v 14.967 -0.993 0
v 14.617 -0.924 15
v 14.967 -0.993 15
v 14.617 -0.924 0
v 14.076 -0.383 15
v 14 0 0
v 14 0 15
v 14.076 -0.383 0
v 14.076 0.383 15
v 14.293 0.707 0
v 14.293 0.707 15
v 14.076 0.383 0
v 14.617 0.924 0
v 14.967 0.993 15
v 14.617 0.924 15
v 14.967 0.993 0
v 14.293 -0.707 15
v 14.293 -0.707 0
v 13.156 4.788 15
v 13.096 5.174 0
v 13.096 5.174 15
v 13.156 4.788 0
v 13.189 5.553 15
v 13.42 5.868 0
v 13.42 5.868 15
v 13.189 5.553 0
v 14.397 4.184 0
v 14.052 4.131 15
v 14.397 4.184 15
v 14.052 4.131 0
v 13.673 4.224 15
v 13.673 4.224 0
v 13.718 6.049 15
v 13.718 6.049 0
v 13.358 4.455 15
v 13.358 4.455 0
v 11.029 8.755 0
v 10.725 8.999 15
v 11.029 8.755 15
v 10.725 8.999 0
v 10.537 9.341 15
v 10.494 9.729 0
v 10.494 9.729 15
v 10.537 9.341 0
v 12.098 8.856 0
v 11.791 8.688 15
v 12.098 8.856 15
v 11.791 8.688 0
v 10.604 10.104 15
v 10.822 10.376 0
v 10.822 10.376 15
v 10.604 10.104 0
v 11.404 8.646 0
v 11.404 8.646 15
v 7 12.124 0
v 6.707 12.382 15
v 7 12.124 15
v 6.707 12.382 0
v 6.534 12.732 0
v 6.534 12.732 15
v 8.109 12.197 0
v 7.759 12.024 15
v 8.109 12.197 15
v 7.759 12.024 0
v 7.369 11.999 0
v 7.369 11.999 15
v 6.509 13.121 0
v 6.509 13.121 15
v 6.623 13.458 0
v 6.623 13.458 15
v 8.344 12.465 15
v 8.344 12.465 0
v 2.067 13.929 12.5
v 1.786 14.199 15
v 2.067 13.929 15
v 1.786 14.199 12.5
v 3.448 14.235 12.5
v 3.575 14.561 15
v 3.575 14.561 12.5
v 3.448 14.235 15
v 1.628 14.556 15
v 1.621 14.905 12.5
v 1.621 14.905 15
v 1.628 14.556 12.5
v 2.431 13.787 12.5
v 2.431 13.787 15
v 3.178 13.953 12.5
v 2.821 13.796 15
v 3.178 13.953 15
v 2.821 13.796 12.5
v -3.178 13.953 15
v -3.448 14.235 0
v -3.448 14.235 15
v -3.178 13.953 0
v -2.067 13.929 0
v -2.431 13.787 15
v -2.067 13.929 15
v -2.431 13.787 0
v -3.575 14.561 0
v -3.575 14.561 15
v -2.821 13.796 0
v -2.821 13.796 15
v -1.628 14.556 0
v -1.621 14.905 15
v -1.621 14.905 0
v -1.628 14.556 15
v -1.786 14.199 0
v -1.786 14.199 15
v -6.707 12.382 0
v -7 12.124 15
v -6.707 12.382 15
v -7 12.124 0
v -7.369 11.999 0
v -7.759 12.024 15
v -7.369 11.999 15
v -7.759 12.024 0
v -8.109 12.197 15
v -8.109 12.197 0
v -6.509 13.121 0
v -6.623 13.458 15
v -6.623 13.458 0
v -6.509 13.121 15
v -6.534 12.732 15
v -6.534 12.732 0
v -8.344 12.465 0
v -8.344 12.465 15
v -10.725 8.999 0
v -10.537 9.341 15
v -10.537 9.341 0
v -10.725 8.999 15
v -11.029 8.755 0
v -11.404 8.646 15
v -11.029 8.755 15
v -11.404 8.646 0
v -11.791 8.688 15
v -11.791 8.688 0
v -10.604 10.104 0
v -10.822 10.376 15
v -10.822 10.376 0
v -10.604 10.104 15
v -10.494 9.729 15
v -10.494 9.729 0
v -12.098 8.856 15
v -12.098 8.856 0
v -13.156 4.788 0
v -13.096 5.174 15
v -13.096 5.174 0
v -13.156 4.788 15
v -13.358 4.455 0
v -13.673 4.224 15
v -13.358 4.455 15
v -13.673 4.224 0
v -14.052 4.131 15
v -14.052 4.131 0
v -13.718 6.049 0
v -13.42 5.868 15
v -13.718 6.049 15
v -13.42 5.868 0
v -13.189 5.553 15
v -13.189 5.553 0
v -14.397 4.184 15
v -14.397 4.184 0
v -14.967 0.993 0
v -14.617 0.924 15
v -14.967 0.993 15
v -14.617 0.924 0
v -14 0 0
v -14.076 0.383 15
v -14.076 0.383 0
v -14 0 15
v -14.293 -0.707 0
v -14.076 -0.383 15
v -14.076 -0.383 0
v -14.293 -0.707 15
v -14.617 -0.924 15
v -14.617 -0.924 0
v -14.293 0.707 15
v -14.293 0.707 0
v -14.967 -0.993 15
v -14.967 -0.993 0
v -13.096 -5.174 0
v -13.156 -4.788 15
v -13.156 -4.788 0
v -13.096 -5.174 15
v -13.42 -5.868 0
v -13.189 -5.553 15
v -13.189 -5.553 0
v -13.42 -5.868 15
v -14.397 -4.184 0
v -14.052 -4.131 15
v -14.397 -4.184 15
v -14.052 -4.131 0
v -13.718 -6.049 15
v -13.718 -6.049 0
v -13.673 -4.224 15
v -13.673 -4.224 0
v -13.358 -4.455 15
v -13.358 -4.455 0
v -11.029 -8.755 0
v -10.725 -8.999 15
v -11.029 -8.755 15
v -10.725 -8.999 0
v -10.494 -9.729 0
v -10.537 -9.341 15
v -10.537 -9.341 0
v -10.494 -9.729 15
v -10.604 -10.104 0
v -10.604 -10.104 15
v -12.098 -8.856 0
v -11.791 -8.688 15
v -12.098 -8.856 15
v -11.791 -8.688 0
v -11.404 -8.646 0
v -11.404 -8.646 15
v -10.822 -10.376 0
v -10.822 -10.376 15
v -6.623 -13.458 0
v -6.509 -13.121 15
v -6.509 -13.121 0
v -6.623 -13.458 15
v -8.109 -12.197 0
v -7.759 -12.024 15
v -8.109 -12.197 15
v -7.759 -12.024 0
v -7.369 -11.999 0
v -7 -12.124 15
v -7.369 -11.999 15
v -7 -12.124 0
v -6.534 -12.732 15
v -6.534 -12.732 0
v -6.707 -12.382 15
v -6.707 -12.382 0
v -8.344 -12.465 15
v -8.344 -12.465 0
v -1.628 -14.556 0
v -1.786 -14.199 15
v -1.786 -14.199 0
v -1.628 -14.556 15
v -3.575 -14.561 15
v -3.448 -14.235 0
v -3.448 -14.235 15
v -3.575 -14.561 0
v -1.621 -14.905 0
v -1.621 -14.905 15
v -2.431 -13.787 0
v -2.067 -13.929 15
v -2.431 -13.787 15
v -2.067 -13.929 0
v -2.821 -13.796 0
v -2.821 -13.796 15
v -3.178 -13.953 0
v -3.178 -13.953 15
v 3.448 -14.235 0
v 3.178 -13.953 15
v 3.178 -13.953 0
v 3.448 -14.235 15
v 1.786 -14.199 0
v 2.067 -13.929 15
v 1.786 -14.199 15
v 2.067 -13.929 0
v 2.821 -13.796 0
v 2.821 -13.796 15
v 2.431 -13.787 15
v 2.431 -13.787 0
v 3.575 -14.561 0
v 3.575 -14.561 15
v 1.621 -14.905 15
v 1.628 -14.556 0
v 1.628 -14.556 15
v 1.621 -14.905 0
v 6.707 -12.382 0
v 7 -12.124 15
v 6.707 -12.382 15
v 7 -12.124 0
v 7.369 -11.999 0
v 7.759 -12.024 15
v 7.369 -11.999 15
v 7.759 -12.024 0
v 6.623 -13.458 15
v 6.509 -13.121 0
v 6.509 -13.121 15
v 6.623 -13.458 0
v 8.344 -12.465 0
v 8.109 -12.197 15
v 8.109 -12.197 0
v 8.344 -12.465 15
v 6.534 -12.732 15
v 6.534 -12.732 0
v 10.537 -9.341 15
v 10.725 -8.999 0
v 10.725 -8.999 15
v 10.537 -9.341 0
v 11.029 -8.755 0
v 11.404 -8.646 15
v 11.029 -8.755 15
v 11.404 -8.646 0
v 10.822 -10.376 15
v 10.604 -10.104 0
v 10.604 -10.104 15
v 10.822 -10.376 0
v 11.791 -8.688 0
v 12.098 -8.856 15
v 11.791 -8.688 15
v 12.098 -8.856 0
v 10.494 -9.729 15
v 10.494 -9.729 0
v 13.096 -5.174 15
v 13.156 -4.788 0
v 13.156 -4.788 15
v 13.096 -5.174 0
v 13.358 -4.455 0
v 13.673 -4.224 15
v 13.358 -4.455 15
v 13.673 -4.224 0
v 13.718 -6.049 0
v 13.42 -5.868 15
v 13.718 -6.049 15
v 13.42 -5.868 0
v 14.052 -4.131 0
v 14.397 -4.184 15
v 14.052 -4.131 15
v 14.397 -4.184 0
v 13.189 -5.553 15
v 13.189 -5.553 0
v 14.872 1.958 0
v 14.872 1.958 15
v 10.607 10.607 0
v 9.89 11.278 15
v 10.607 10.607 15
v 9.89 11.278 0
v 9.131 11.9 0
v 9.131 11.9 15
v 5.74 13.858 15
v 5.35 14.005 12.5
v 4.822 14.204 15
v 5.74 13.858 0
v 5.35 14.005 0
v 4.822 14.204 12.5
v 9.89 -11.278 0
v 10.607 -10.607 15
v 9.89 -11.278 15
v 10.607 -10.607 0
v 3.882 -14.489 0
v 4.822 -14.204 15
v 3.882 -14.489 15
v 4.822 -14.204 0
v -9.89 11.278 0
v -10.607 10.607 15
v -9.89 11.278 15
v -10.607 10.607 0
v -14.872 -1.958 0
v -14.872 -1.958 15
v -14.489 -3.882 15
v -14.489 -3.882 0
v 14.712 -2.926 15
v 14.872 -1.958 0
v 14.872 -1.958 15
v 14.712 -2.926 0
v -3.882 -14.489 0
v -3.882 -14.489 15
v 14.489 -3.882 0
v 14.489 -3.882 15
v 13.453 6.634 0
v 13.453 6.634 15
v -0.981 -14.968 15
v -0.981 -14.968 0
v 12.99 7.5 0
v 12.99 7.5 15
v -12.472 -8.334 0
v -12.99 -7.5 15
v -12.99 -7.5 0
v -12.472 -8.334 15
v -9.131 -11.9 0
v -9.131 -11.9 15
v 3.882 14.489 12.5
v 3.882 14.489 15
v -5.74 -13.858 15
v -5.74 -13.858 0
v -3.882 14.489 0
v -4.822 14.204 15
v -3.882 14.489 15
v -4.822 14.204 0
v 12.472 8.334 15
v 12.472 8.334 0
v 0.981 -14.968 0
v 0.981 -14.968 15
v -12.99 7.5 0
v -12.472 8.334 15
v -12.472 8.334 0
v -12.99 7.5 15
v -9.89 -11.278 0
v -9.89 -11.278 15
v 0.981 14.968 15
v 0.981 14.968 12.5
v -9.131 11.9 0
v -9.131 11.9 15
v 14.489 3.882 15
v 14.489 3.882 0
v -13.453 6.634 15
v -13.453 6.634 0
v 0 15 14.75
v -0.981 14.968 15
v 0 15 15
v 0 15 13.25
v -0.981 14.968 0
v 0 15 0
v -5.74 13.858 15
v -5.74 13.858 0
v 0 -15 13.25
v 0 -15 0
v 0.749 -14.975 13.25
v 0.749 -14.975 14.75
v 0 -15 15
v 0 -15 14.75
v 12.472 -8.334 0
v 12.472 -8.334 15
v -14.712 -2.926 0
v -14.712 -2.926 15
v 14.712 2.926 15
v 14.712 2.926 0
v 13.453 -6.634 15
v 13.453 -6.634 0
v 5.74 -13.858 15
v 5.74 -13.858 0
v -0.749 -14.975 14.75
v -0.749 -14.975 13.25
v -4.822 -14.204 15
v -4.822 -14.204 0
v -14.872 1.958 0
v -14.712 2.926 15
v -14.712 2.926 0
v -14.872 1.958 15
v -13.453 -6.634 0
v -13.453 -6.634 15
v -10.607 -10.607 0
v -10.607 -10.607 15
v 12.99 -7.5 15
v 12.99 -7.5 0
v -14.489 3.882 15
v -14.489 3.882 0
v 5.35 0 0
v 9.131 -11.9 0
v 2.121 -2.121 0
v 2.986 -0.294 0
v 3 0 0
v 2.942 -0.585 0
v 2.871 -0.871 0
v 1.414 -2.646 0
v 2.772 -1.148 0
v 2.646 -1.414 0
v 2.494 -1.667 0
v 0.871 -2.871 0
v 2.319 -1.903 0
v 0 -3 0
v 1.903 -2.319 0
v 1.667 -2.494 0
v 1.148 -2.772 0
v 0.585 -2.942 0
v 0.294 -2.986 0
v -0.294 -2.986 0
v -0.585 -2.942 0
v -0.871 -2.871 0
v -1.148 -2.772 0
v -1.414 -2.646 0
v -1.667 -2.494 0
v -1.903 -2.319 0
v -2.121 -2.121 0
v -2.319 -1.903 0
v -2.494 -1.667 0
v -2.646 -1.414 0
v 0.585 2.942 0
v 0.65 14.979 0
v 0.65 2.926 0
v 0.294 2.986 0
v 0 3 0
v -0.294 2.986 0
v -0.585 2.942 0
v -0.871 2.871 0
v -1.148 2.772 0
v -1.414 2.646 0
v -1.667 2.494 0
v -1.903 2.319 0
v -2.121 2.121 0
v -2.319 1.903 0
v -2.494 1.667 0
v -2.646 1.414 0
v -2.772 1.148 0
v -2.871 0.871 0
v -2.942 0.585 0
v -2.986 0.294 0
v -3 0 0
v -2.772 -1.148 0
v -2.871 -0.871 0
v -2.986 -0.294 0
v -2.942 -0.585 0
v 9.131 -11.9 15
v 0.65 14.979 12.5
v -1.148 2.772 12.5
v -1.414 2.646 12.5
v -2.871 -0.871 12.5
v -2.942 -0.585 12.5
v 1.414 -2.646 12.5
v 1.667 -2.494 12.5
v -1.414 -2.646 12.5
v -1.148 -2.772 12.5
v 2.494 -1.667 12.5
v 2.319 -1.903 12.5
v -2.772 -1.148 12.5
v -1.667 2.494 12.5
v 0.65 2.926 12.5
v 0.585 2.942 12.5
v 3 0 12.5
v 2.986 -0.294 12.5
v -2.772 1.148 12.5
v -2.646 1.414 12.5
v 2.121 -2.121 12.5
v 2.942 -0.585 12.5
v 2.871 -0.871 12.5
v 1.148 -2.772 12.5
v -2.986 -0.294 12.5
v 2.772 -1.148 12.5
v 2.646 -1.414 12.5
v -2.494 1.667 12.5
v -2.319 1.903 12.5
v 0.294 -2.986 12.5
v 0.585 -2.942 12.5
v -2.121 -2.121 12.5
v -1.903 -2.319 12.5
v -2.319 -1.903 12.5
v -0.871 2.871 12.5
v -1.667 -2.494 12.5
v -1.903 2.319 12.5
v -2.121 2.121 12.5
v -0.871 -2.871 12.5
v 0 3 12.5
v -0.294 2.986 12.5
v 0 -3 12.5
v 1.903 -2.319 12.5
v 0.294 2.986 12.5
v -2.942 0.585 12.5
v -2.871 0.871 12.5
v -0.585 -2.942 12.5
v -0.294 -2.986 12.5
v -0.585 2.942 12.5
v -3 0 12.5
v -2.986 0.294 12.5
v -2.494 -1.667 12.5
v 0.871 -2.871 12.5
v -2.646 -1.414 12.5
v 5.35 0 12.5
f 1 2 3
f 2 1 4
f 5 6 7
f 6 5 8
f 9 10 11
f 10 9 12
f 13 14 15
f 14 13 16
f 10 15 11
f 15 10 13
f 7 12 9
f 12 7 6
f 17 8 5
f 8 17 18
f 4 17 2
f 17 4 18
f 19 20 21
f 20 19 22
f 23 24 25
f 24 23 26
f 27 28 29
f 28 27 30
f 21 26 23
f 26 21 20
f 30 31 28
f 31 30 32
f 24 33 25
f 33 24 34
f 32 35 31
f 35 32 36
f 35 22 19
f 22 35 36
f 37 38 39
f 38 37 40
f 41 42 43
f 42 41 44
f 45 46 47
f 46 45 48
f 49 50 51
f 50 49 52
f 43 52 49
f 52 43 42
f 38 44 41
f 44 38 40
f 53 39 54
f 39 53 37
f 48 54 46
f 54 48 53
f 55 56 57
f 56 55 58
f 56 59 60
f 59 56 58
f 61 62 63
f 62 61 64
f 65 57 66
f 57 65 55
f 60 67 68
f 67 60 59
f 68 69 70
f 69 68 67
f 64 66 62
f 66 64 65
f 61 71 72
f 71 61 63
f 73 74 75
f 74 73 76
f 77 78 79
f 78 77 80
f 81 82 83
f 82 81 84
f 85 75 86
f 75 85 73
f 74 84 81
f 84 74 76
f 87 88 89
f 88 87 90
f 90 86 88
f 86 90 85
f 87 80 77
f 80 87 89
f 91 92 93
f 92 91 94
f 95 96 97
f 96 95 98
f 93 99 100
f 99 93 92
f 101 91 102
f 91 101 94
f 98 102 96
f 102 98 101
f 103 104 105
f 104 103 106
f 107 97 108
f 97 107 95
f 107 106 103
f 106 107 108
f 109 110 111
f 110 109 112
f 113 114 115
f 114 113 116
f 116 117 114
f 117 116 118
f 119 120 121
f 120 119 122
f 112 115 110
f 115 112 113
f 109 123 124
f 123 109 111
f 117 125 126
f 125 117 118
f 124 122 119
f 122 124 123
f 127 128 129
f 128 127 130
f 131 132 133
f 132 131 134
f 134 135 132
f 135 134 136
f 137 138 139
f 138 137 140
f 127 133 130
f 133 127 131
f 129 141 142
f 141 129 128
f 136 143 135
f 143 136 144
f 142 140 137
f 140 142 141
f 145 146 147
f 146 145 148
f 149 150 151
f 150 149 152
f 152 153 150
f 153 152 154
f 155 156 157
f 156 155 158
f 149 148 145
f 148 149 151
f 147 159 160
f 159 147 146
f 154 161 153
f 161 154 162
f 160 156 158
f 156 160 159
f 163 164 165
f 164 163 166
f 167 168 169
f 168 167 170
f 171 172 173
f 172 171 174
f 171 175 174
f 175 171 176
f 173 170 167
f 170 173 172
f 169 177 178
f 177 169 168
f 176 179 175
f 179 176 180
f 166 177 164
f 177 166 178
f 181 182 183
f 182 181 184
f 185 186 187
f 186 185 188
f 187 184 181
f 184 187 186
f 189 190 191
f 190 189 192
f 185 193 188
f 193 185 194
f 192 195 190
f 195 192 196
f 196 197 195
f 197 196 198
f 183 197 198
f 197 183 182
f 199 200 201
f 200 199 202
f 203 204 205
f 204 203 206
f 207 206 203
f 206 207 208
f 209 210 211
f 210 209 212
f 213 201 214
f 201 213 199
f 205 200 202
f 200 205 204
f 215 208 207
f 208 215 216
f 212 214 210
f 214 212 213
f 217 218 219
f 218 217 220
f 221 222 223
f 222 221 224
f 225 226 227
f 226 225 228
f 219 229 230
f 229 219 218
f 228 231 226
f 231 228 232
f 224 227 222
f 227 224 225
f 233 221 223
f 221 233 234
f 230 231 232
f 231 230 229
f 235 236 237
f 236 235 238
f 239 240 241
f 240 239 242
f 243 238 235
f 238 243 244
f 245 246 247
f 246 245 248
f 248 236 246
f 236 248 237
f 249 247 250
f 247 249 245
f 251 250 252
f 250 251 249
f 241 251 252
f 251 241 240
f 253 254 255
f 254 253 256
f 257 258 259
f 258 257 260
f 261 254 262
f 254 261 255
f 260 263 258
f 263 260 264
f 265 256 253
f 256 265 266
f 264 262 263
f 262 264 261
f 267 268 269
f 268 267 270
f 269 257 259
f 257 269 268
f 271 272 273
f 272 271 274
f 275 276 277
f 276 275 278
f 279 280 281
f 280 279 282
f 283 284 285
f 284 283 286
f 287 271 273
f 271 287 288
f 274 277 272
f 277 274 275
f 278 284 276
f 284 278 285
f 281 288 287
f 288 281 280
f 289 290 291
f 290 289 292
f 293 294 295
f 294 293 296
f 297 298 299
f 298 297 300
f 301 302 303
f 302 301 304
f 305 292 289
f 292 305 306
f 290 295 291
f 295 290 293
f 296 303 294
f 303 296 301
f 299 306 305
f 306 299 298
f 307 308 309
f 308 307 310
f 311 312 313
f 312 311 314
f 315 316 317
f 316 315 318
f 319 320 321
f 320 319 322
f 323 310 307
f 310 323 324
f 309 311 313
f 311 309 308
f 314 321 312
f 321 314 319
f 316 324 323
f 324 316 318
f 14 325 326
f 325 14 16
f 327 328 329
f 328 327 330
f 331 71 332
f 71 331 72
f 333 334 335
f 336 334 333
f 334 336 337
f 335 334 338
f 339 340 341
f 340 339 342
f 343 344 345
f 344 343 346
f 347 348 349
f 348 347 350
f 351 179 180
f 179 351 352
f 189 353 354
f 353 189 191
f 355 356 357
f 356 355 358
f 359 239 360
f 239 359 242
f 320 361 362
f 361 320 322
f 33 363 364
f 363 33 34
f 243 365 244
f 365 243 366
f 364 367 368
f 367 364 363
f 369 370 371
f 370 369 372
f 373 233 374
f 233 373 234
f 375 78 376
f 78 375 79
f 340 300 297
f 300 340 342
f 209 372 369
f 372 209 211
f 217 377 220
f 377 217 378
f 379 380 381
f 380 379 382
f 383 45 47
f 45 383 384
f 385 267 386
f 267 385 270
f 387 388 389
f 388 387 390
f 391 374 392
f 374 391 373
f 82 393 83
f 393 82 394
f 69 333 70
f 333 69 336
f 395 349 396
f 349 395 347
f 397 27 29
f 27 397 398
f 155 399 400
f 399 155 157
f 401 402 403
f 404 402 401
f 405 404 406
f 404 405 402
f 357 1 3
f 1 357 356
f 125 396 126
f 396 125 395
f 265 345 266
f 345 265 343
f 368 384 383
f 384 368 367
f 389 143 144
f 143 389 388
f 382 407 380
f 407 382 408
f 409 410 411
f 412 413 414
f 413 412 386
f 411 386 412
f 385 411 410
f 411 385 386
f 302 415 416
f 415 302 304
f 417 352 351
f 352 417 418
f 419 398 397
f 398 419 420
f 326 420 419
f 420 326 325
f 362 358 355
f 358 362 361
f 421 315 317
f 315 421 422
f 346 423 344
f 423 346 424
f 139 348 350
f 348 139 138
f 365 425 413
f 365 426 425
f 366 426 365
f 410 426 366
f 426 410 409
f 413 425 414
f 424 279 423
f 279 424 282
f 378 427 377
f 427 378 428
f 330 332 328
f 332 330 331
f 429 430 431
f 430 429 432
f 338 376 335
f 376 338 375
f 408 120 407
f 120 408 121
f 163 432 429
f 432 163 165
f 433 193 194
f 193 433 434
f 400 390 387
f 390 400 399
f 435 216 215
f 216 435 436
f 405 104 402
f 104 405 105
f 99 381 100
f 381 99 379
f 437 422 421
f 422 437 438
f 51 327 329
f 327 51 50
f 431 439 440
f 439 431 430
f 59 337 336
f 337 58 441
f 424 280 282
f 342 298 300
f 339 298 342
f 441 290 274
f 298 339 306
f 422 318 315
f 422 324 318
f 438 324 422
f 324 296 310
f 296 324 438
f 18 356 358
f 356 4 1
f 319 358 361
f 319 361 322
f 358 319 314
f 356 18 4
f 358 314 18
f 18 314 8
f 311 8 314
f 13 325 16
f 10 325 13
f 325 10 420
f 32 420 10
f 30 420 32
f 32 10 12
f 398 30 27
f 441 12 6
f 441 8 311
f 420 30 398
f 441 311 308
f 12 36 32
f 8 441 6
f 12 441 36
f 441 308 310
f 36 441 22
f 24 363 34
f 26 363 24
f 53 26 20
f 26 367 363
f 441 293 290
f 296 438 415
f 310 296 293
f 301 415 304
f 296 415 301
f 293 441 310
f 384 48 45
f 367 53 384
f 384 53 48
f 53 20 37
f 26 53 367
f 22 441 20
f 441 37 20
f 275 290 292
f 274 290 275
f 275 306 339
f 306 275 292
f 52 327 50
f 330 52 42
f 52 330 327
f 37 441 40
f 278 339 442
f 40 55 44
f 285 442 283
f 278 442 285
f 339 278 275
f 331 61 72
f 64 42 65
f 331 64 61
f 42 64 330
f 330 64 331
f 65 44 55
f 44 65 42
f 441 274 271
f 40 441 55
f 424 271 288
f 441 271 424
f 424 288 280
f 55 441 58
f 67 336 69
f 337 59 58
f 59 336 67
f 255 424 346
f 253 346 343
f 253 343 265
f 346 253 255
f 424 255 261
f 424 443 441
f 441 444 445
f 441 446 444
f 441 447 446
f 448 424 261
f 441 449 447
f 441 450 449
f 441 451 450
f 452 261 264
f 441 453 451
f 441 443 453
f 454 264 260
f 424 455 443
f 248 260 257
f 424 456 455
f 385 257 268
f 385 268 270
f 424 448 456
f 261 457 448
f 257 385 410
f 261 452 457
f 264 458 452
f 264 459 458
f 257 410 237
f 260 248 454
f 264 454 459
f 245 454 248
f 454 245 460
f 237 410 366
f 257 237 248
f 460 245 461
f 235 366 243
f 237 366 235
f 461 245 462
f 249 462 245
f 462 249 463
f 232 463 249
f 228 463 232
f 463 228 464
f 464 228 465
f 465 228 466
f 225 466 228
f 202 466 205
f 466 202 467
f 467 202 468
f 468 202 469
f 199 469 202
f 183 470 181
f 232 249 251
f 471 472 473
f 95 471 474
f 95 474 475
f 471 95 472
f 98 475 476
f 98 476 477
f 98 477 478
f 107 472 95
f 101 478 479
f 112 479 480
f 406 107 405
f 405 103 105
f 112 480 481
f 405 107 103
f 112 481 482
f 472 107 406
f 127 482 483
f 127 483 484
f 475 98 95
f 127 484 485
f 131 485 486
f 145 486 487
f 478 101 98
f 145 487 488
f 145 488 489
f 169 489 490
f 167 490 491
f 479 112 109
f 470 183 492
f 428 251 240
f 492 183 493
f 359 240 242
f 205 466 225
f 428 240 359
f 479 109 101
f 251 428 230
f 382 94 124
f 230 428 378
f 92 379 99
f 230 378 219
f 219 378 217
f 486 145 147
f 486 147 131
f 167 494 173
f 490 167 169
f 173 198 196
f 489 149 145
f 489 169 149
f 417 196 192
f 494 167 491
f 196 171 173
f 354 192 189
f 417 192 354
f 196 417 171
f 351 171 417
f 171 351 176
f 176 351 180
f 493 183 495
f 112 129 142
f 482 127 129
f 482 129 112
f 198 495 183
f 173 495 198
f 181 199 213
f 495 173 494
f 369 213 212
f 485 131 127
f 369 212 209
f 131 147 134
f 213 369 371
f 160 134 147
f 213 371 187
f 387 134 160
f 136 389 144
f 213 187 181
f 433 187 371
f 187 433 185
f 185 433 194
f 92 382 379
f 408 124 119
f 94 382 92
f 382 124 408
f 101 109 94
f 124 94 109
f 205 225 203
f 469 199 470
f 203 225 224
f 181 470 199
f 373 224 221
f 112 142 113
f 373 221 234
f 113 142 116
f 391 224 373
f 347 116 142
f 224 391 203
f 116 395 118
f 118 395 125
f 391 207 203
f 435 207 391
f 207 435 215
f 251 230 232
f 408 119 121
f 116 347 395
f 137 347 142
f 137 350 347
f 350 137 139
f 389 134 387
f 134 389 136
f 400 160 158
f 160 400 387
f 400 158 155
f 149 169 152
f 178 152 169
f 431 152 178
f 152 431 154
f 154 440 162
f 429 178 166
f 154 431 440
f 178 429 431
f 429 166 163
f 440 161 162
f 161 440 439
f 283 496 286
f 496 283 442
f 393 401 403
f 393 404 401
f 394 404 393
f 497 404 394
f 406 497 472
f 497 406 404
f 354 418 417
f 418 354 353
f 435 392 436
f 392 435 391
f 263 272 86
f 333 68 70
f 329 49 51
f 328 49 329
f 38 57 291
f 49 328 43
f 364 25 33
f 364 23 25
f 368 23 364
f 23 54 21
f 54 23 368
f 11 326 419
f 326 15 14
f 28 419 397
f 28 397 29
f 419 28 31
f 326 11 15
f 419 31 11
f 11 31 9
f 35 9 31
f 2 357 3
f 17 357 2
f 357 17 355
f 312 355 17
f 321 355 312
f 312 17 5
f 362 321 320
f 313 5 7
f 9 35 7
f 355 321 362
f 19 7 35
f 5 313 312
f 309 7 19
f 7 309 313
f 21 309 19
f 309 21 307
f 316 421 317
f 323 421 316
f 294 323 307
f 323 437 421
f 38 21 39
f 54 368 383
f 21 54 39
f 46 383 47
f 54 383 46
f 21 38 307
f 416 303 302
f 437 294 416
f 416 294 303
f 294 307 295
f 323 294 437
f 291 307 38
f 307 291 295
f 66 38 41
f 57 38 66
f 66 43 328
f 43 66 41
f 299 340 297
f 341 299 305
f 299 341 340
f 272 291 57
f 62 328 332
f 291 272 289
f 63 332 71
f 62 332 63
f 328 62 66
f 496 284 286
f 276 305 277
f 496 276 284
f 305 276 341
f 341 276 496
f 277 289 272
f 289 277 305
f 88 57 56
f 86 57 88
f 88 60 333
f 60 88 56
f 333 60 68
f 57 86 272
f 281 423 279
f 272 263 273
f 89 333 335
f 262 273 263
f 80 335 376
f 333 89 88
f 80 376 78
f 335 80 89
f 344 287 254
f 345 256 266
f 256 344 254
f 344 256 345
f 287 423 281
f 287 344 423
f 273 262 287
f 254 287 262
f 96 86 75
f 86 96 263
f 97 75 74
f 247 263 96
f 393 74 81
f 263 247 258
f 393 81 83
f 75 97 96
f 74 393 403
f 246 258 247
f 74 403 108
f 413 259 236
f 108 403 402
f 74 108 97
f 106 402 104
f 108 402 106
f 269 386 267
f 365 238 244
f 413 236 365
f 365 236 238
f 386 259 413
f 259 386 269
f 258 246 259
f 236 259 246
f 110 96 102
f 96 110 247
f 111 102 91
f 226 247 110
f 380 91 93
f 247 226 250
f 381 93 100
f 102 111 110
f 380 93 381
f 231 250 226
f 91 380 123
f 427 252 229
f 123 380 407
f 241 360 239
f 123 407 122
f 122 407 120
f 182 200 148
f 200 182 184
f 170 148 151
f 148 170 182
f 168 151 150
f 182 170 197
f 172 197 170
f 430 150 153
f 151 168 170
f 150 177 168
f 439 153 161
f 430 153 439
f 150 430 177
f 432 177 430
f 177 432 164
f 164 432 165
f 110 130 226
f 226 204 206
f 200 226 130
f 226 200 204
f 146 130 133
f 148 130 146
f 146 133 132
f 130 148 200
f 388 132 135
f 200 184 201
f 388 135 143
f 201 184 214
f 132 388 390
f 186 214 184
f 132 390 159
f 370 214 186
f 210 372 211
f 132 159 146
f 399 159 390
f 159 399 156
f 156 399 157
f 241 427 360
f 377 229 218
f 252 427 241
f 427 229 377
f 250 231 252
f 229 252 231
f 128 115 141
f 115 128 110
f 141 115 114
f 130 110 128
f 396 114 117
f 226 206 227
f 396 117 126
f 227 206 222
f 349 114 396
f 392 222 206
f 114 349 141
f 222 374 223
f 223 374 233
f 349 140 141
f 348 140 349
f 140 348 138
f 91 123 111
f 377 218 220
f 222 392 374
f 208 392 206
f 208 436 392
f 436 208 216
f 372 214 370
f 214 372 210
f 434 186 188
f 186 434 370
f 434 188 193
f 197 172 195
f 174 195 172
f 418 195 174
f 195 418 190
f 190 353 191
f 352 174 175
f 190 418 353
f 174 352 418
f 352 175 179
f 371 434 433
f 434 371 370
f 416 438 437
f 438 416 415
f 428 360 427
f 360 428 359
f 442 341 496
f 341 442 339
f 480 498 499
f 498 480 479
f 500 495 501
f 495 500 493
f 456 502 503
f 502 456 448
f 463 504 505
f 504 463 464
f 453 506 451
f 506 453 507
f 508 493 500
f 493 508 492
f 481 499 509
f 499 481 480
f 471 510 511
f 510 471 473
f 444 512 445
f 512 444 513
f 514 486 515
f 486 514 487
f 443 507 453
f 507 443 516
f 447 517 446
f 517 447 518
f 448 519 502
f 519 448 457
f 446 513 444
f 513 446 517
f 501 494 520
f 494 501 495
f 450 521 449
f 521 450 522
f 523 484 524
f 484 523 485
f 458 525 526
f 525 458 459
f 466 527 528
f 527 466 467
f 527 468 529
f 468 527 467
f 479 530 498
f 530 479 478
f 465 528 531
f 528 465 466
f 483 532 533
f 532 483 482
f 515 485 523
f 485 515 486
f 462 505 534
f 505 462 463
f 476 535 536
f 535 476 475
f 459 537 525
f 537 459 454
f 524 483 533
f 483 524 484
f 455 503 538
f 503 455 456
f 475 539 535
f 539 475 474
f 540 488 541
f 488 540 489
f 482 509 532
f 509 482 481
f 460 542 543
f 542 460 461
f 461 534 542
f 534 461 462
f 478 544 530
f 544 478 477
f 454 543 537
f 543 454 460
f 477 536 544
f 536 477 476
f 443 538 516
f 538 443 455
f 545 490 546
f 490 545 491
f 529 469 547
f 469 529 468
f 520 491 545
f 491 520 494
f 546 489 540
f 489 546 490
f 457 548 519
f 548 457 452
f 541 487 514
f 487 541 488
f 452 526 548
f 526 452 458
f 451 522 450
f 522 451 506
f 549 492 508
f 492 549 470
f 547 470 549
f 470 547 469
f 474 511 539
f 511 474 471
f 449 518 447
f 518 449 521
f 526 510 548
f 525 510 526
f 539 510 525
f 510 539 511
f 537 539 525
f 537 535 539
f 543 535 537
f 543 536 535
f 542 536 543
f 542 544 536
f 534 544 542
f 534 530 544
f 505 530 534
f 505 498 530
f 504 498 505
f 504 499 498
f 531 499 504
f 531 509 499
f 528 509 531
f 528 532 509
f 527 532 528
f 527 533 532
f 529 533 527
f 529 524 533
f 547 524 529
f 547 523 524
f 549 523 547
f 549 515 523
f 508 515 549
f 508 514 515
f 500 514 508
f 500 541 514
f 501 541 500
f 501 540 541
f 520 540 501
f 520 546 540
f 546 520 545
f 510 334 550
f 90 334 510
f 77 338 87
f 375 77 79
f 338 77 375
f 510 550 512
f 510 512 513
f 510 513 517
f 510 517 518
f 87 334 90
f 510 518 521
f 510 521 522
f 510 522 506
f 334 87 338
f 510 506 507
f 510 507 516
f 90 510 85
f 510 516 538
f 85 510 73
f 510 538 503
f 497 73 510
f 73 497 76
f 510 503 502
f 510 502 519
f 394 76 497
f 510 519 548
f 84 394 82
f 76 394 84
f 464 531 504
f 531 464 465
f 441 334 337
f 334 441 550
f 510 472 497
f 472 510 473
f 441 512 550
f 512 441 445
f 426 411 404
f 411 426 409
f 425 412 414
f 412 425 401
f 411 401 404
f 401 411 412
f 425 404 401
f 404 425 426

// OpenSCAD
// Replacement knob for a hotplate stirrer with a D-shaft
// Print orientation: bottom face (with D-bore) on the bed at z = 0

// ---------------- Parameters ----------------
knob_d        = 30;    // knob outer diameter
knob_h        = 15;    // knob height
shaft_d       = 6;     // D-shaft diameter (bore diameter)
bore_depth    = 12;    // blind bore depth from bottom face
bore_flat     = 4.7;   // distance from D-bore flat to opposite side of circle
groove_count  = 18;    // number of vertical grip grooves
groove_d      = 2;     // grip groove diameter (half-cylinder)
pointer_w     = 1.5;   // pointer groove width
pointer_d     = 1;     // pointer groove depth
eps           = 0.5;   // overcut so cutting faces are not coplanar

$fn = 96;

// ---------------- Model ----------------
difference() {
    // Main body, centred on origin in XY, sitting on z = 0
    cylinder(d = knob_d, h = knob_h);

    // D-shaped blind bore from bottom face
    translate([0, 0, -eps])
        cylinder(d = shaft_d, h = bore_depth + 2 * eps, $fn = 64);
    // cut the flat side of the D, leaving the specified distance to the arc
    translate([-(bore_flat - shaft_d) / 2, 0, -eps])
        cube([bore_flat, knob_d + 2 * eps, bore_depth + 2 * eps]);

    // Vertical grip grooves around the full height
    for (i = [0 : groove_count - 1])
        rotate([0, 0, i * 360 / groove_count])
            translate([knob_d / 2, 0, -eps])
                cylinder(d = groove_d, h = knob_h + 2 * eps, $fn = 16);

    // Pointer groove on top face, from centre to outer edge
    translate([0, 0, knob_h - pointer_d])
        linear_extrude(height = pointer_w, center = true)
            polygon([[-pointer_w / 2, -knob_d / 2],
                     [ pointer_w / 2, -knob_d / 2],
                     [0, knob_d / 2]]);
}
